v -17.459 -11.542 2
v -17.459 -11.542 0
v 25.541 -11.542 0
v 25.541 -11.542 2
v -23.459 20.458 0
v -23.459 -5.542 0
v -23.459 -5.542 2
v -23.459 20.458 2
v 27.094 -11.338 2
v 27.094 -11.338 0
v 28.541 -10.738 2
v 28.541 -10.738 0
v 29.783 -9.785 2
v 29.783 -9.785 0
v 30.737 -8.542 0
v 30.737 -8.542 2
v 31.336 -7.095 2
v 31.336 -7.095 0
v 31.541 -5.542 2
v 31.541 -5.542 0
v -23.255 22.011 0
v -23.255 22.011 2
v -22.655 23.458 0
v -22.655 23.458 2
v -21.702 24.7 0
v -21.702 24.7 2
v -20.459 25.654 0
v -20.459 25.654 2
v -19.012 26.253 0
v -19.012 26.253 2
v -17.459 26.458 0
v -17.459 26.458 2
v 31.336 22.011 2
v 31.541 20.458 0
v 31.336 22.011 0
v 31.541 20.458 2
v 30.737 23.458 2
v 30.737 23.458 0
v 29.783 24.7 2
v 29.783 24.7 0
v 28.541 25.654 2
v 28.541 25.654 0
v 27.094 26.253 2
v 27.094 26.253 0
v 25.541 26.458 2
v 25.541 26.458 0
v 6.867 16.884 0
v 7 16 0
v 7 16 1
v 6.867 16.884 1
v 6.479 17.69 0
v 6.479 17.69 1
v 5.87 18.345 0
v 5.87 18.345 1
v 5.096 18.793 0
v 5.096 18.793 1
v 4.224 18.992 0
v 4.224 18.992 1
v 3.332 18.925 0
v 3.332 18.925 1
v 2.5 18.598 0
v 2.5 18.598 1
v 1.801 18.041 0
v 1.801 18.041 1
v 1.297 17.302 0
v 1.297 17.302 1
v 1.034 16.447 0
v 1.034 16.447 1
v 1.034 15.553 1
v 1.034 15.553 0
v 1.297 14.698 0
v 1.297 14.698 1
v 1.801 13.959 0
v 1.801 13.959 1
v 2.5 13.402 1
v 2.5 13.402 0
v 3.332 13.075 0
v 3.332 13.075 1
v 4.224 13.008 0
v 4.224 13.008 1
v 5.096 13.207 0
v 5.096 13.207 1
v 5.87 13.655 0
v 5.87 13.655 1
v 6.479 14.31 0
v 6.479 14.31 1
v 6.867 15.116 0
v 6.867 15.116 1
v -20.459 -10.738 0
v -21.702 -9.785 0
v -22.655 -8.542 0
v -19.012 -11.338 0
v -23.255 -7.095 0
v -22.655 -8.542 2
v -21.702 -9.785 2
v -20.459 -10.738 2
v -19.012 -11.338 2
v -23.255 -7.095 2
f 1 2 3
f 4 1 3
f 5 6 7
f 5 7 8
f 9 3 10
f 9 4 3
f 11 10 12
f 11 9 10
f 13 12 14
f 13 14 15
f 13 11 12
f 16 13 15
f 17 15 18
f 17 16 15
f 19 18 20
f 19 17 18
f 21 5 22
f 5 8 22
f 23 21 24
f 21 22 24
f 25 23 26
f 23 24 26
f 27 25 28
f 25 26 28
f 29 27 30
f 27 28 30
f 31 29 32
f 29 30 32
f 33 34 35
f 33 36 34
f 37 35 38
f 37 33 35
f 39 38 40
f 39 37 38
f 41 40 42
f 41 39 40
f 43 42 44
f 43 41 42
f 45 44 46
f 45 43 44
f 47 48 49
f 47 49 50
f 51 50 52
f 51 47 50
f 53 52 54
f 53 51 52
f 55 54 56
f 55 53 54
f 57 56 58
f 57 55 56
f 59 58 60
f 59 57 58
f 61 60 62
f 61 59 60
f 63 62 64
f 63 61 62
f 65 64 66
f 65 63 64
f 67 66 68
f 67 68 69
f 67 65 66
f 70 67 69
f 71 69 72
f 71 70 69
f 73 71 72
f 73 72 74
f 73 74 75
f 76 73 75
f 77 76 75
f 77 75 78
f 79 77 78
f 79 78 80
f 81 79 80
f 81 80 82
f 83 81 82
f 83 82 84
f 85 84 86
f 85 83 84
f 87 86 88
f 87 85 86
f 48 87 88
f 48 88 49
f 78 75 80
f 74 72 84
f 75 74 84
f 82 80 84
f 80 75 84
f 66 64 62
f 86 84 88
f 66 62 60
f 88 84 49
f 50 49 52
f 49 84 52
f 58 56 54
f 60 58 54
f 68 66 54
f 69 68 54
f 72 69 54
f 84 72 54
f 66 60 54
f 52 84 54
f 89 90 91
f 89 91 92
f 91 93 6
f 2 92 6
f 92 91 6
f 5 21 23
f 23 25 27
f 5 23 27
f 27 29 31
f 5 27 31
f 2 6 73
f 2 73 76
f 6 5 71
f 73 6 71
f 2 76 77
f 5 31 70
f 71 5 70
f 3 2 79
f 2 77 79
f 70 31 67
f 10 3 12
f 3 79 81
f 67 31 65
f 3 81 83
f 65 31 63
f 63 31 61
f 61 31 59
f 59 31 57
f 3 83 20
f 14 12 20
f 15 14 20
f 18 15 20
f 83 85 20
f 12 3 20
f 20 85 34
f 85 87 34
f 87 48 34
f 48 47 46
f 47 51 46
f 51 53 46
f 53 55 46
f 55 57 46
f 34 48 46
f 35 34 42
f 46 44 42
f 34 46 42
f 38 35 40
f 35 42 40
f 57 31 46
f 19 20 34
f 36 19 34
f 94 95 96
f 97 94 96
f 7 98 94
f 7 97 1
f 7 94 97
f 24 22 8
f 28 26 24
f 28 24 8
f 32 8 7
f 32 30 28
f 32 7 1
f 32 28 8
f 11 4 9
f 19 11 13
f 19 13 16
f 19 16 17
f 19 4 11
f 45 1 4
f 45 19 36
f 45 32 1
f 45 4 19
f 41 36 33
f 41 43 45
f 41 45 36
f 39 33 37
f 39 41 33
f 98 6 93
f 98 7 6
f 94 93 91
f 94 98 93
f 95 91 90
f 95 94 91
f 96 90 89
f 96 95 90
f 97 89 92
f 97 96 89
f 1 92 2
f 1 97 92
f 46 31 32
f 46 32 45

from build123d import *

# Parameters (mm, degrees)
CYLINDER_R     = 3
CYLINDER_DEPTH = 1
BOX_W          = 55
BOX_H          = 38
BOX_DEPTH      = 2
FILLET_R       = 6


with BuildPart() as cilindro:
    # Cylinder → Cylinder (new body)
    with BuildSketch(Plane(origin=(4, 16, 0), x_dir=(1, 0, 0), z_dir=(0, 0, 1))):
        Circle(CYLINDER_R)
    extrude(amount=CYLINDER_DEPTH)


with BuildPart() as cut002:
    # Box → Box (new body)
    with BuildSketch(Plane(origin=(-23.4593, -11.5423, 0), x_dir=(1, 0, 0), z_dir=(0, 0, 1))):
        with Locations((27.5, 19)):
            Rectangle(BOX_W, BOX_H)
    extrude(amount=BOX_DEPTH)

    # Fillet
    fillet_edges = [cut002.edges().sort_by_distance(p)[0] for p in [
        (-23.4593, -11.5423, 1),
        (-23.4593, 26.4577, 1),
        (31.5407, -11.5423, 1),
        (31.5407, 26.4577, 1),
    ]]
    fillet(fillet_edges, radius=FILLET_R)

    # Cut002: cut Cilindro
    add(cilindro.part, mode=Mode.SUBTRACT)


solid = cut002.part
